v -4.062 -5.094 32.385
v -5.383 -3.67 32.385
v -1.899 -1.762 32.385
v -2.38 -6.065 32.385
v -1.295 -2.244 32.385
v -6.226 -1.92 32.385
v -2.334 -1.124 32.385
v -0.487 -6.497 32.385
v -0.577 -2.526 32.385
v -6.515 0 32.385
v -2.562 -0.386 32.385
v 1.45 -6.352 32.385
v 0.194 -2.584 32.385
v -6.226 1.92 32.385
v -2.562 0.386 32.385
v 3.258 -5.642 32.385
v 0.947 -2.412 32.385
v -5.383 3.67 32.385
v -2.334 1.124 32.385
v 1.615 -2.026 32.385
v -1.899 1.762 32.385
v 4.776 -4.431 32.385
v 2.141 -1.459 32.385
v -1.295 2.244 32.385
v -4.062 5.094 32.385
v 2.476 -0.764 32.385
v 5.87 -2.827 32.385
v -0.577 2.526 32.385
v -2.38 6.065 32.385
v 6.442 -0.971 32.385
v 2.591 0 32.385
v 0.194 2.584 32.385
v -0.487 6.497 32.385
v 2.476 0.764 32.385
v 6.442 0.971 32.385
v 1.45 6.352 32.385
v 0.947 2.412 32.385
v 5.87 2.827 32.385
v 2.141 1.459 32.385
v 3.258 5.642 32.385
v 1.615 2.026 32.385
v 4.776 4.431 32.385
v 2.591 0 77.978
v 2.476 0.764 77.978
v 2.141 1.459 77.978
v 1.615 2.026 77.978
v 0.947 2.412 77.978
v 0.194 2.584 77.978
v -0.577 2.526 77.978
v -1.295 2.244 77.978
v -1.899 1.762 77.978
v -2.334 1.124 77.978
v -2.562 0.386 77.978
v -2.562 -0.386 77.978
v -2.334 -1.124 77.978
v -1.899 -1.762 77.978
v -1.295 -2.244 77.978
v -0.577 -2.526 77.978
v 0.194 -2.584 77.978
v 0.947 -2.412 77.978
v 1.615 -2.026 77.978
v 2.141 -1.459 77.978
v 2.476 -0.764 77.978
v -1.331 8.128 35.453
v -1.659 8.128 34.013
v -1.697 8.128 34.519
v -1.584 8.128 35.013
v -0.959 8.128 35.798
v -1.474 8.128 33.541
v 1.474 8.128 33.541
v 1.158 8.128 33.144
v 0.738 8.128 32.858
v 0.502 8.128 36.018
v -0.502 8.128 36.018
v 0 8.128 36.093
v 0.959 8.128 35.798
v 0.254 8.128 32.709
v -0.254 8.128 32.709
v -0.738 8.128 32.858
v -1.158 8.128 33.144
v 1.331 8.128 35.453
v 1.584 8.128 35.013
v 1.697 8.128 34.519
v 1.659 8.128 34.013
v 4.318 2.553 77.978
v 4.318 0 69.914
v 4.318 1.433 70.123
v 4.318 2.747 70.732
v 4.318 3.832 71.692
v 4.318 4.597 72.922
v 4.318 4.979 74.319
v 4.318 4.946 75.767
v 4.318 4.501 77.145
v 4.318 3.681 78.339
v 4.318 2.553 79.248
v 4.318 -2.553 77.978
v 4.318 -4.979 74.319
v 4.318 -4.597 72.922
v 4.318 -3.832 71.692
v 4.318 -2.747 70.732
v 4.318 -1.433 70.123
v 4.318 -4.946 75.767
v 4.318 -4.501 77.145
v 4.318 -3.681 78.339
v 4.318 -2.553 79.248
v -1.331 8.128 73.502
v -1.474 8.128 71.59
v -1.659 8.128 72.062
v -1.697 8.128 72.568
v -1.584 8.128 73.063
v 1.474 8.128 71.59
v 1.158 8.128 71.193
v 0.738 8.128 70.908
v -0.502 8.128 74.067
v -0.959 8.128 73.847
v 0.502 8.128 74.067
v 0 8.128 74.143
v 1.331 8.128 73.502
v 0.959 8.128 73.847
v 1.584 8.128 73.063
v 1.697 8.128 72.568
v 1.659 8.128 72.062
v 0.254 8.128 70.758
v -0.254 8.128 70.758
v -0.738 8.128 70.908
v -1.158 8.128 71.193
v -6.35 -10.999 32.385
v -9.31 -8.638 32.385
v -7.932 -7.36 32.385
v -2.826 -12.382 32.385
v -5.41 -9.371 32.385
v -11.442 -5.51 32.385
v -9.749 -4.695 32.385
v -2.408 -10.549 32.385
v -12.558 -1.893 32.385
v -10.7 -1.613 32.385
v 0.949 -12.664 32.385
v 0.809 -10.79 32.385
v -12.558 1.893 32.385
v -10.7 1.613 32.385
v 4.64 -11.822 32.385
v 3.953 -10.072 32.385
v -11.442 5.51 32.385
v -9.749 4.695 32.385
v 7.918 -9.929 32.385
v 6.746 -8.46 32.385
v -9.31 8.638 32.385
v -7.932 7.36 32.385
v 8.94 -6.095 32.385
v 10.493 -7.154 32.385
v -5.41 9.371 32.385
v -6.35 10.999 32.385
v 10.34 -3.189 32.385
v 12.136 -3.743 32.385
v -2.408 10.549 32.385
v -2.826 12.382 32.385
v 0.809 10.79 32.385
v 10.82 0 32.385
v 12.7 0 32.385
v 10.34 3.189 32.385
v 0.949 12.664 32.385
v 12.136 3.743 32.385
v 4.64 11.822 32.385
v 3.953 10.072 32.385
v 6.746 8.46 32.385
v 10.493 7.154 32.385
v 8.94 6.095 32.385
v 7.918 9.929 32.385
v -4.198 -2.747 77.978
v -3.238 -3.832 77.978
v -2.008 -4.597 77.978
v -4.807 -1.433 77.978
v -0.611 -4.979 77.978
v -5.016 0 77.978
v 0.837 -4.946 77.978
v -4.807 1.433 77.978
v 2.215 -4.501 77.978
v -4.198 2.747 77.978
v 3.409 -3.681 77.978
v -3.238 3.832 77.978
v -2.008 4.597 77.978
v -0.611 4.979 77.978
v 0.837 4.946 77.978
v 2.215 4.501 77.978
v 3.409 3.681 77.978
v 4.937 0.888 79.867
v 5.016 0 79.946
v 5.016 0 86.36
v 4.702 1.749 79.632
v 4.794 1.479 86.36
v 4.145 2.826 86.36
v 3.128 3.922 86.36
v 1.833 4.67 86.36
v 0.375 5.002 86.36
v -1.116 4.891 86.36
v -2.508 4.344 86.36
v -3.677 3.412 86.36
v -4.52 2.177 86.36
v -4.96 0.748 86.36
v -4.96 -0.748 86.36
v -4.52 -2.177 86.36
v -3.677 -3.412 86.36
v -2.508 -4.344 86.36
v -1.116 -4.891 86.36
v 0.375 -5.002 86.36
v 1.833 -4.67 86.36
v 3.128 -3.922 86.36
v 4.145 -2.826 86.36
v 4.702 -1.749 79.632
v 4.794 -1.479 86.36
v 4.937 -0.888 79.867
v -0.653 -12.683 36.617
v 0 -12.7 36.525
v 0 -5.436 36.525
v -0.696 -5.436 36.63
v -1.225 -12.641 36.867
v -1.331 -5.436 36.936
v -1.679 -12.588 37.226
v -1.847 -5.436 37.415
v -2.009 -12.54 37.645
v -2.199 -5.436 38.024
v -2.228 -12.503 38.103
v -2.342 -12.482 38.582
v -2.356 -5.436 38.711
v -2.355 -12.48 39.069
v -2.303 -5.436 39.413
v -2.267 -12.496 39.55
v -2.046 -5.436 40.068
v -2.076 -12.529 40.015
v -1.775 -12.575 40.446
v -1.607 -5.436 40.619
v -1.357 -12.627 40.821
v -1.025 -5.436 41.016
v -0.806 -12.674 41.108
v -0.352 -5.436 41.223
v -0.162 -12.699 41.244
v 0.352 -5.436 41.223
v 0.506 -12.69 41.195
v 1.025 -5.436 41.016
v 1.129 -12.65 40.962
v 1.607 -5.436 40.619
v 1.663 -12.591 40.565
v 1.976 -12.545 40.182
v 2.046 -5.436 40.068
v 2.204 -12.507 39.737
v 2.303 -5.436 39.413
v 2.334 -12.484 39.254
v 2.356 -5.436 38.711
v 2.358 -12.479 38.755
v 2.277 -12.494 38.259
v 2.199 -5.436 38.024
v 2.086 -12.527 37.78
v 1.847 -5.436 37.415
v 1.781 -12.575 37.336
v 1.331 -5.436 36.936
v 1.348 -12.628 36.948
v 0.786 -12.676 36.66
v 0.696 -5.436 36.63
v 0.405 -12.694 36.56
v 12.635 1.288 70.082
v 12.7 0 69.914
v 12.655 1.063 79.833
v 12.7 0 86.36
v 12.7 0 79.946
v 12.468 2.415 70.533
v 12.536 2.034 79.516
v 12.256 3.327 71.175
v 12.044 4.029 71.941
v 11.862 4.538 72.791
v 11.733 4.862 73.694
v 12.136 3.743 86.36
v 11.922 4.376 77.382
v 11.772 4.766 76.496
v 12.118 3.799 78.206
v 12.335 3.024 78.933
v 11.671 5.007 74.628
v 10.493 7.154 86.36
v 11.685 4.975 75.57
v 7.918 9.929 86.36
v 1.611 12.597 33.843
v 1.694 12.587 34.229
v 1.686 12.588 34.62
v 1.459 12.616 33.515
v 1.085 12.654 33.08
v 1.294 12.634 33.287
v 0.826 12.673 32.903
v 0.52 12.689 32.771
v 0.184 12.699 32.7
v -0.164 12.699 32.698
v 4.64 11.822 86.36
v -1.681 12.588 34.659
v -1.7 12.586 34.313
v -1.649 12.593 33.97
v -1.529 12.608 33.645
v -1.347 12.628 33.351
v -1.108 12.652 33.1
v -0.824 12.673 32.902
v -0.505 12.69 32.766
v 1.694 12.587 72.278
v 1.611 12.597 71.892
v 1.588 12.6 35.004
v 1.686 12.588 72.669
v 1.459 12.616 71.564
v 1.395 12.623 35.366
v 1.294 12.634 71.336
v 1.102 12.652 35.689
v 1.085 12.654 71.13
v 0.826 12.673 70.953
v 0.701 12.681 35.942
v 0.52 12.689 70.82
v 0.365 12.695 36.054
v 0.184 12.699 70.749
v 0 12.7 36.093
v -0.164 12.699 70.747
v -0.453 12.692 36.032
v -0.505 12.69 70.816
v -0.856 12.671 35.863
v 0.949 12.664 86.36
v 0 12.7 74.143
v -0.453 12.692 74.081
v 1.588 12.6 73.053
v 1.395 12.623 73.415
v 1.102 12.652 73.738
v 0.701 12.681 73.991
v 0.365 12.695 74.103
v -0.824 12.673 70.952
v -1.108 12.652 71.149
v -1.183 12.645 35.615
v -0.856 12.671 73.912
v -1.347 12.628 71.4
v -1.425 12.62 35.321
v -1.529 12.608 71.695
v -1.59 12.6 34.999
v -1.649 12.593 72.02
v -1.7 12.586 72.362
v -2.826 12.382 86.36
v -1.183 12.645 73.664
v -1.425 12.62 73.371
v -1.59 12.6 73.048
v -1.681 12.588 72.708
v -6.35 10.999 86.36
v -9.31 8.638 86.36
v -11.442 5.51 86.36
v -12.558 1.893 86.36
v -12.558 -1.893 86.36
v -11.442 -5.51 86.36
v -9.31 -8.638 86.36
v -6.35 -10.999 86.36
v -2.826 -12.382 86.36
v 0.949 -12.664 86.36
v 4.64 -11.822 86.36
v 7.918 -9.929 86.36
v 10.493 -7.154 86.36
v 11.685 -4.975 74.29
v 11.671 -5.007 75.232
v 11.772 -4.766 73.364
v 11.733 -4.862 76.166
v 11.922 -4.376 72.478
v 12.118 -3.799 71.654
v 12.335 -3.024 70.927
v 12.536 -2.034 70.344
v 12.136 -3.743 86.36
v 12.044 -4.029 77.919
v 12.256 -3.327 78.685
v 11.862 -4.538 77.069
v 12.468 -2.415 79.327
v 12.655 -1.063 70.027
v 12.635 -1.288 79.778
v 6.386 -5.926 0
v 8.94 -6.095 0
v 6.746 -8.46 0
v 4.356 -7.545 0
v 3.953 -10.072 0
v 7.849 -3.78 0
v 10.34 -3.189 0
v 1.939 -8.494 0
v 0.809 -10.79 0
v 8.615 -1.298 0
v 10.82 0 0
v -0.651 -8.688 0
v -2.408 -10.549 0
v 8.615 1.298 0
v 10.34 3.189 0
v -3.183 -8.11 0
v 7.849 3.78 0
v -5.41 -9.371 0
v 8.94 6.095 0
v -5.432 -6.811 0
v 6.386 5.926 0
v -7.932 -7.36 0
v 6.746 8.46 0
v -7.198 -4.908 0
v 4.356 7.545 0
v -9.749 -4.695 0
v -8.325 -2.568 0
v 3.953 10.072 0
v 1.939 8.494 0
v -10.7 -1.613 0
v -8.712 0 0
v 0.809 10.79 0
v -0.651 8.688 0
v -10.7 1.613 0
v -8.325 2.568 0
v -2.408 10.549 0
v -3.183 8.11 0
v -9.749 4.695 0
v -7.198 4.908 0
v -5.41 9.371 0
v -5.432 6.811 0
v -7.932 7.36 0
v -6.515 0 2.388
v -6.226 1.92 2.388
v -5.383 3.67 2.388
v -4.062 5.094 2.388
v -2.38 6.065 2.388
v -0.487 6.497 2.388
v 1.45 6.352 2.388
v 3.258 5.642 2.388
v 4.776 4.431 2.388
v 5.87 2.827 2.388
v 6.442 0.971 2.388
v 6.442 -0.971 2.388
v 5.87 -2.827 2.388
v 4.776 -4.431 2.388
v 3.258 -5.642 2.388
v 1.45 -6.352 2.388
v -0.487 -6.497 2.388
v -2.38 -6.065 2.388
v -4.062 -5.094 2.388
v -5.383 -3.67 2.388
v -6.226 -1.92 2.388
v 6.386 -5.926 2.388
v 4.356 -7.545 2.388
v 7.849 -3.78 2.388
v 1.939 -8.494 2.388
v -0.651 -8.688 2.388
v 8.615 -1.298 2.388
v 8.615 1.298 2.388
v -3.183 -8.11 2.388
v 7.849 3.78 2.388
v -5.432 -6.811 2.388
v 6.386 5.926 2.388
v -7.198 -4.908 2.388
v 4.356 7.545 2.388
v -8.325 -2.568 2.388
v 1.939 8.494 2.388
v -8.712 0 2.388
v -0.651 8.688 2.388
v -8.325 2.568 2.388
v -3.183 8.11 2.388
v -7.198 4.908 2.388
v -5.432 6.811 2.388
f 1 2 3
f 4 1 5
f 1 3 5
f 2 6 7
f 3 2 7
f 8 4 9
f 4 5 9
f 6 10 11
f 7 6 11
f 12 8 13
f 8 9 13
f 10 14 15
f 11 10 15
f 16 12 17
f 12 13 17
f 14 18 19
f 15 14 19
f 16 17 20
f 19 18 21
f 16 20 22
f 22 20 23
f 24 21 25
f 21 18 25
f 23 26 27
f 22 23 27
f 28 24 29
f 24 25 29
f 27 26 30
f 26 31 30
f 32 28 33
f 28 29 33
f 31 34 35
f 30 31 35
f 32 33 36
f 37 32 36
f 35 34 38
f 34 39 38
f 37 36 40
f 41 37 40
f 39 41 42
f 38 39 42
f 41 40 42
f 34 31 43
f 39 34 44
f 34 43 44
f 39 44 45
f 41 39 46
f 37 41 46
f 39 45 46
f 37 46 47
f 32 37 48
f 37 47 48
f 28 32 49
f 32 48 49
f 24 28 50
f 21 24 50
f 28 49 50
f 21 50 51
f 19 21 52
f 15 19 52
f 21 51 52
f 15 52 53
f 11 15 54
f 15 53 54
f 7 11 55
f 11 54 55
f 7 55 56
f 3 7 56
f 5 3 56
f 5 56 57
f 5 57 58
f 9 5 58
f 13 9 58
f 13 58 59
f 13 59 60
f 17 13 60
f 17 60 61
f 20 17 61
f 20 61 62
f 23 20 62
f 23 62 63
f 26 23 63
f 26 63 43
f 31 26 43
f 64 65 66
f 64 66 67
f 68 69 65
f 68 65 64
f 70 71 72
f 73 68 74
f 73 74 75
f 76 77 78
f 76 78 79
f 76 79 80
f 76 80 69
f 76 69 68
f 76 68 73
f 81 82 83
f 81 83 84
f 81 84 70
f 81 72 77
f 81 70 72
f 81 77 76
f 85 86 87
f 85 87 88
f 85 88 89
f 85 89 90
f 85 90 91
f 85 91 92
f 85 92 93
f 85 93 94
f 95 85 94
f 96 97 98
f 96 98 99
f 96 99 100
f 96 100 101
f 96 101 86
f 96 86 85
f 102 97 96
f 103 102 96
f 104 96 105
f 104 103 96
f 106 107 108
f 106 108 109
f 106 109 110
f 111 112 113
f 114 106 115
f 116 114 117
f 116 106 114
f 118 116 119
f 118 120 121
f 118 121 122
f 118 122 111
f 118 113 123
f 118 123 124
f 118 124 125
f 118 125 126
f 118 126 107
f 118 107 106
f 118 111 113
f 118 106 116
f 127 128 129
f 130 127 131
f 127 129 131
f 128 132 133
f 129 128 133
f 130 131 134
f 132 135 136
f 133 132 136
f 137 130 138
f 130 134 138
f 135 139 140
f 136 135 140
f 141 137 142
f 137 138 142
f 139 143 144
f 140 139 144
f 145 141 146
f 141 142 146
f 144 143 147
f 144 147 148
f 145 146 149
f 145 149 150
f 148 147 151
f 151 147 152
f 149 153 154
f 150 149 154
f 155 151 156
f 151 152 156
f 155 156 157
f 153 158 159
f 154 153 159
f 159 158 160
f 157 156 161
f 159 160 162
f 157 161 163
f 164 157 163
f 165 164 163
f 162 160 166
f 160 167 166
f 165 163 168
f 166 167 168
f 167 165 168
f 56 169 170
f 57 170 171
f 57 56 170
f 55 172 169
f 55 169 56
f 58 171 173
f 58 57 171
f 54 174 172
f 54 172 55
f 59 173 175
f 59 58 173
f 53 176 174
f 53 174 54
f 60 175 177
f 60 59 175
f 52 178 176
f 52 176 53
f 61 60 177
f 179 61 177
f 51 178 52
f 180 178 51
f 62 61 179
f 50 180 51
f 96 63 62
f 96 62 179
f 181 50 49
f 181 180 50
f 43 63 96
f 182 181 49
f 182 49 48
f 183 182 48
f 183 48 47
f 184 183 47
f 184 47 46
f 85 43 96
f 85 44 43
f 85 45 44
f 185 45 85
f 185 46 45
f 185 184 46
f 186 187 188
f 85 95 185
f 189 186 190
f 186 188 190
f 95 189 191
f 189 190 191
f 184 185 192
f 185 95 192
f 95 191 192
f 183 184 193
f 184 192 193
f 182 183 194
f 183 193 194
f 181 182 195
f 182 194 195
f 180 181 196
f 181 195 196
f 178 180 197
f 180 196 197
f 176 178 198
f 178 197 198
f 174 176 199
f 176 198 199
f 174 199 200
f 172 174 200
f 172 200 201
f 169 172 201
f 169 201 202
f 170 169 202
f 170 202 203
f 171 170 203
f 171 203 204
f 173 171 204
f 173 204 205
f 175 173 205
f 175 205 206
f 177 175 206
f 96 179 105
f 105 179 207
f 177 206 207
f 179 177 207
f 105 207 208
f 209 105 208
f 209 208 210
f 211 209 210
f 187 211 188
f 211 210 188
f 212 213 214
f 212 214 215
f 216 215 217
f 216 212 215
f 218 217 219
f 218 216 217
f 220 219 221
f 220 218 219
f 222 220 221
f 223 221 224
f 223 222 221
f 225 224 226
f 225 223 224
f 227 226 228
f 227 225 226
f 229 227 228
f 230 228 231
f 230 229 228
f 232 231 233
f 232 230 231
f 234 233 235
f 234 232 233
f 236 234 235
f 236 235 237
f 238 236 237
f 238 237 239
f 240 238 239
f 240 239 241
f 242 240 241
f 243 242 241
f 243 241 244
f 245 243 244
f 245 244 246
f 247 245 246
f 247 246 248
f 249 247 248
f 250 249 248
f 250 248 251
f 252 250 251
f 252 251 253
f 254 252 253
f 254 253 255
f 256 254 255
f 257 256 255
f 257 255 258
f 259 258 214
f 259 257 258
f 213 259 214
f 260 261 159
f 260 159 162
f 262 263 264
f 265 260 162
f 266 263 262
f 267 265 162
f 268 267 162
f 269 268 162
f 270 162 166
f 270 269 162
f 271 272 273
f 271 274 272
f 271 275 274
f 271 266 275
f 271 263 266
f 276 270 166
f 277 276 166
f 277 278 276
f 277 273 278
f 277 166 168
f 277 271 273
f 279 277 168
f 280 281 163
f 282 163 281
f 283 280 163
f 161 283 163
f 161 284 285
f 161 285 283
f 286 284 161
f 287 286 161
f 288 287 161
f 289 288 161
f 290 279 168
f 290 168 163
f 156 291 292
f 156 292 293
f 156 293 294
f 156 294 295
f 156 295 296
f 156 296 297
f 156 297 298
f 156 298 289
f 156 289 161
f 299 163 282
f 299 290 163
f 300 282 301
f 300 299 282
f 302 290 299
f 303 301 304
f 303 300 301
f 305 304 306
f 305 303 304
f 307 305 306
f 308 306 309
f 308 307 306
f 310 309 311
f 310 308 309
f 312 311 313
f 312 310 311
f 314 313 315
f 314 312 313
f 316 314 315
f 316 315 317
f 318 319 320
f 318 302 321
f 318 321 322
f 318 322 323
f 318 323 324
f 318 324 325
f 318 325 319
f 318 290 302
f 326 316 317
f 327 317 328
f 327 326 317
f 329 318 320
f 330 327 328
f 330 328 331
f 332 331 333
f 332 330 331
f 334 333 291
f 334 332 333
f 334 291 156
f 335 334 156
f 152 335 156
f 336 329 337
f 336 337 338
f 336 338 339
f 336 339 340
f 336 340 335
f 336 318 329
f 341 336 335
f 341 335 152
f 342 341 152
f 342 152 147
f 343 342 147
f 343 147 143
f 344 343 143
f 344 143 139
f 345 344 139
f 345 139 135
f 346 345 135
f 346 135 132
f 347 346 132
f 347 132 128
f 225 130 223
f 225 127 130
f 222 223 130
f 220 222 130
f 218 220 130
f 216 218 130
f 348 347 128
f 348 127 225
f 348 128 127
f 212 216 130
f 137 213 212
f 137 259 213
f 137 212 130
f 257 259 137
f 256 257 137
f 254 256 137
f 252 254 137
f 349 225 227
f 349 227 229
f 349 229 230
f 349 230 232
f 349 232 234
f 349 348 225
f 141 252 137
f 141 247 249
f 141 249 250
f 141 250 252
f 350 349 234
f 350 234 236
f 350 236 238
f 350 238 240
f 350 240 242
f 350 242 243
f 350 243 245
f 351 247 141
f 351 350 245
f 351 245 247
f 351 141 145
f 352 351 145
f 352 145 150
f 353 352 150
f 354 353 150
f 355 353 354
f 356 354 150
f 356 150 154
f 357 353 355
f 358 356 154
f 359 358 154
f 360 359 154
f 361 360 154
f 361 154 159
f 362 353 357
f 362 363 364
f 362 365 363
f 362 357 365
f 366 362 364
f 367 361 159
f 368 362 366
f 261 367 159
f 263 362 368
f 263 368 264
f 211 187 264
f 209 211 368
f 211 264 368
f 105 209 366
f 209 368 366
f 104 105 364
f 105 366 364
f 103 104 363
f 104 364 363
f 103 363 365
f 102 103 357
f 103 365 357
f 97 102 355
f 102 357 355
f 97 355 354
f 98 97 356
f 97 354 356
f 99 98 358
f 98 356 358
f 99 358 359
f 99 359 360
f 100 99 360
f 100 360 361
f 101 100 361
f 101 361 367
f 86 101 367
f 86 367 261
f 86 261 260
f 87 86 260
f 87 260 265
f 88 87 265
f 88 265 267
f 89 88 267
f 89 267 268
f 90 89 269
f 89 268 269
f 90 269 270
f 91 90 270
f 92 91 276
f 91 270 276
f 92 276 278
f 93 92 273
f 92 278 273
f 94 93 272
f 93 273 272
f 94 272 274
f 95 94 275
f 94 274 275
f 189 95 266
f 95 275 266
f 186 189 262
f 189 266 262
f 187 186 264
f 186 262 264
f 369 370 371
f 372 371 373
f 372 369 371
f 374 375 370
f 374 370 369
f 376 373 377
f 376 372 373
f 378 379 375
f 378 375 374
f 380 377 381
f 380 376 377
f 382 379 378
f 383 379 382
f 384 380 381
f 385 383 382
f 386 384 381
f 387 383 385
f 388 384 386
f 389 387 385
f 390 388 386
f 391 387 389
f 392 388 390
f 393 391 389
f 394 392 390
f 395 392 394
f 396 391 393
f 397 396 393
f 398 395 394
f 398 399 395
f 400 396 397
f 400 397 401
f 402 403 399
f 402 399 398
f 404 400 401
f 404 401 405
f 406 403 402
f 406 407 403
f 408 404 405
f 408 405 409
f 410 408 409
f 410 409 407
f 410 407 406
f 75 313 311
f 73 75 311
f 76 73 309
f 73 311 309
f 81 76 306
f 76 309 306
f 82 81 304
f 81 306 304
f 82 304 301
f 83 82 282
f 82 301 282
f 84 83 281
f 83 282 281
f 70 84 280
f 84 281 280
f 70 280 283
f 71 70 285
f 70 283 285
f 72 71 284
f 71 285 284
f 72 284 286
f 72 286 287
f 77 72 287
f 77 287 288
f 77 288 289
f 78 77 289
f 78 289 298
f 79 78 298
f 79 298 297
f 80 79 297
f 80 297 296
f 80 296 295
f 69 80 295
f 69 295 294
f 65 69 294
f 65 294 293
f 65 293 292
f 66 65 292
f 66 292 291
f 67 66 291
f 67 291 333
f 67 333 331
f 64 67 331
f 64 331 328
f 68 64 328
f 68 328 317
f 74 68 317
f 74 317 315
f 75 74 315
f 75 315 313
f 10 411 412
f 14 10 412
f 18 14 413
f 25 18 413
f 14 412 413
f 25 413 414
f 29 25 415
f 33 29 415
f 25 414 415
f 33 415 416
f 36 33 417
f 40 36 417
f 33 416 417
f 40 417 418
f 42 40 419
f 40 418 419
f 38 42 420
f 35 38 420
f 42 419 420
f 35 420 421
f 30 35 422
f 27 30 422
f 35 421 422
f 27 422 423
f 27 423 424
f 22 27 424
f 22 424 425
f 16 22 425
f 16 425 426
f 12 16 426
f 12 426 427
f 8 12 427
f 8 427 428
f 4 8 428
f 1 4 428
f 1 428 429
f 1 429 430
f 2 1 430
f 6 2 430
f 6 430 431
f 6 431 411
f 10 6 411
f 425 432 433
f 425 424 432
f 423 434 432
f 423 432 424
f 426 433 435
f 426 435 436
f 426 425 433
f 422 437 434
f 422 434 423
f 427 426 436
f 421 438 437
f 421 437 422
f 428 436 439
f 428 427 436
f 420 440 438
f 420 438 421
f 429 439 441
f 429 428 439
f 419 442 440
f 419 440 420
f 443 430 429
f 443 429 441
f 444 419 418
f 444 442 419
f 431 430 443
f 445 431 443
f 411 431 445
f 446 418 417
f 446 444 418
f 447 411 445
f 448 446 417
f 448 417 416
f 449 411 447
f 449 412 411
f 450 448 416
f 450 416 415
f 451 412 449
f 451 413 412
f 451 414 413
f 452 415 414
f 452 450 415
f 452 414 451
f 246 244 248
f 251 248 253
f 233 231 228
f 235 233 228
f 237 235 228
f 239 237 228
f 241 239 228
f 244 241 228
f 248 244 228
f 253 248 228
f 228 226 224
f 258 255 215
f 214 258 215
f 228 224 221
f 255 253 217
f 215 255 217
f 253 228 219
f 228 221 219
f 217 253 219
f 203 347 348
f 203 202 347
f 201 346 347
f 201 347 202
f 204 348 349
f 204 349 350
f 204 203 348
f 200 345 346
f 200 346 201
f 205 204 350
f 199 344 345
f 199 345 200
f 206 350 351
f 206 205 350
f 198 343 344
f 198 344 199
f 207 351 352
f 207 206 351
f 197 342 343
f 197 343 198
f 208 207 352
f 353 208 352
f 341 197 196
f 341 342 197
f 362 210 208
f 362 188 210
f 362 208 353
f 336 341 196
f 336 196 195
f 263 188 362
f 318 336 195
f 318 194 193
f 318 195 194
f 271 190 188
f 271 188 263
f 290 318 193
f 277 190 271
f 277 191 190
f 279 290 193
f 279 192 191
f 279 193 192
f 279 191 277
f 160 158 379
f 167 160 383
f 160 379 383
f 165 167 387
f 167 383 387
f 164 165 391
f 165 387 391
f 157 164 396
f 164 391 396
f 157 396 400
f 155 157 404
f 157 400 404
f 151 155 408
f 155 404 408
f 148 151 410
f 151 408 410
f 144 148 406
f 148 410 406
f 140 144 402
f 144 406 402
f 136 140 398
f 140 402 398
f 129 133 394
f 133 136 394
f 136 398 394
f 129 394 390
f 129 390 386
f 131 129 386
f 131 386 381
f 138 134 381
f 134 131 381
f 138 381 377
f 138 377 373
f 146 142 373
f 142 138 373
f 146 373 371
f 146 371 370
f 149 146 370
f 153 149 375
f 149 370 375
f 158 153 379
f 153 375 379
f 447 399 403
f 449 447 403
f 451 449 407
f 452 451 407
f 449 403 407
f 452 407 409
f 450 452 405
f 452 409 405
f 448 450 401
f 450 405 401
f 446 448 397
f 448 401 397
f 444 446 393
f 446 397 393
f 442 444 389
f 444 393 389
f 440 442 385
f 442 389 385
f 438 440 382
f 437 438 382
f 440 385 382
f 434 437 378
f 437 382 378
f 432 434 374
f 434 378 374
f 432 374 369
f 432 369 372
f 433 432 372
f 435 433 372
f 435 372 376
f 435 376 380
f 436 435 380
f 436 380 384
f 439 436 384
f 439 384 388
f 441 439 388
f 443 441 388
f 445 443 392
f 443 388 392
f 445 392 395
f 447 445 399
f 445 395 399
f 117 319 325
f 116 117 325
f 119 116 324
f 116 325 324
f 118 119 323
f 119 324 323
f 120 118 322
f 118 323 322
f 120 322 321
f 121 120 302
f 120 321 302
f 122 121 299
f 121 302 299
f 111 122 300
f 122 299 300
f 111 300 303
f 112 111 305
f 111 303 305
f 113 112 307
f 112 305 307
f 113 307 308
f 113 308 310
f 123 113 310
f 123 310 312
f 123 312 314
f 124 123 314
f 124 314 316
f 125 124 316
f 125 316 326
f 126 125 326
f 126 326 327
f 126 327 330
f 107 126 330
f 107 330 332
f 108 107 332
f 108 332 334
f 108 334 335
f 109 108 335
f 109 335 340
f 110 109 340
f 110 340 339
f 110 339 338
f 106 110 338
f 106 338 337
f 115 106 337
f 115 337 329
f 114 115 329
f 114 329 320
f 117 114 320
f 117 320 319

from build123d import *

# Parameters (mm, degrees)
SKETCH1_R          = 10.8204
SKETCH1_R_2        = 8.7122
EXTRUDE1_DEPTH     = 86.36
SKETCH2_R          = 12.7
SKETCH2_R_2        = 2.5908
EXTRUDE2_DEPTH     = 53.975
SKETCH3_R          = 8.7122
SKETCH3_R_2        = 6.5151
EXTRUDE3_DEPTH     = 35.3822
SKETCH4_R          = 8.7122
SKETCH4_R_2        = 6.5151
CUT_EXTRUDE1_DEPTH = 2.3876
SKETCH15_R         = 2.3622
CUT_EXTRUDE5_DEPTH = 7.2644
SKETCH17_R         = 1.7018
CUT_EXTRUDE6_DEPTH = 4.572
SKETCH18_R         = 5.0165
CUT_EXTRUDE7_DEPTH = 8.382
SKETCH19_R         = 5.0165
CUT_EXTRUDE8_DEPTH = 8.382


with BuildPart() as part:
    # Sketch1 → Extrude1 (new body)
    with BuildSketch(Plane.XY):
        Circle(SKETCH1_R)
        Circle(SKETCH1_R_2, mode=Mode.SUBTRACT)
    extrude(amount=EXTRUDE1_DEPTH)

    # Sketch2 → Extrude2 (add)
    with BuildSketch(Plane.XY.offset(86.36)):
        Circle(SKETCH2_R)
        Circle(SKETCH2_R_2, mode=Mode.SUBTRACT)
    extrude(amount=-EXTRUDE2_DEPTH)

    # Sketch3 → Extrude3 (add)
    with BuildSketch(Plane(origin=(0, 0, 0), x_dir=(-1, 0, 0), z_dir=(0, 0, -1))):
        Circle(SKETCH3_R)
        Circle(SKETCH3_R_2, mode=Mode.SUBTRACT)
    extrude(amount=-EXTRUDE3_DEPTH)

    # Sketch4 → Cut-Extrude1 (cut)
    with BuildSketch(Plane(origin=(0, 0, 0), x_dir=(-1, 0, 0), z_dir=(0, 0, -1))):
        Circle(SKETCH4_R)
        Circle(SKETCH4_R_2, mode=Mode.SUBTRACT)
    extrude(amount=-CUT_EXTRUDE1_DEPTH, mode=Mode.SUBTRACT)

    # Sketch15 → Cut-Extrude5 (cut)
    with BuildSketch(Plane(origin=(0, -12.7, 0), x_dir=(-1, 0, 0), z_dir=(0, 1, 0))):
        with Locations(Location((0, 38.8874, 0), (0, 0, 270))):  # turned: the seam where the file's is
            Circle(SKETCH15_R)
    extrude(amount=CUT_EXTRUDE5_DEPTH, mode=Mode.SUBTRACT)

    # Sketch17 → Cut-Extrude6 (cut)
    with BuildSketch(Plane(origin=(0, 12.7, 0), x_dir=(-1, 0, 0), z_dir=(0, 1, 0))):
        with Locations(Location((0, 34.3916, 0), (0, 0, 90))):  # turned: the seam where the file's is
            Circle(SKETCH17_R)
        with Locations(Location((0, 72.4408, 0), (0, 0, 90))):  # turned: the seam where the file's is
            Circle(SKETCH17_R)
    extrude(amount=-CUT_EXTRUDE6_DEPTH, mode=Mode.SUBTRACT)

    # Sketch18 → Cut-Extrude7 (cut)
    with BuildSketch(Plane.XY.offset(86.36)):
        Circle(SKETCH18_R)
    extrude(amount=-CUT_EXTRUDE7_DEPTH, mode=Mode.SUBTRACT)

    # Sketch19 → Cut-Extrude8 (cut)
    with BuildSketch(Plane(origin=(12.7, 0, 0), x_dir=(0, 0, -1), z_dir=(1, 0, 0))):
        with Locations(Location((-74.93, 0, 0), (0, 0, 180))):  # turned: the seam where the file's is
            Circle(SKETCH19_R)
    extrude(amount=-CUT_EXTRUDE8_DEPTH, mode=Mode.SUBTRACT)


solid = part.part
